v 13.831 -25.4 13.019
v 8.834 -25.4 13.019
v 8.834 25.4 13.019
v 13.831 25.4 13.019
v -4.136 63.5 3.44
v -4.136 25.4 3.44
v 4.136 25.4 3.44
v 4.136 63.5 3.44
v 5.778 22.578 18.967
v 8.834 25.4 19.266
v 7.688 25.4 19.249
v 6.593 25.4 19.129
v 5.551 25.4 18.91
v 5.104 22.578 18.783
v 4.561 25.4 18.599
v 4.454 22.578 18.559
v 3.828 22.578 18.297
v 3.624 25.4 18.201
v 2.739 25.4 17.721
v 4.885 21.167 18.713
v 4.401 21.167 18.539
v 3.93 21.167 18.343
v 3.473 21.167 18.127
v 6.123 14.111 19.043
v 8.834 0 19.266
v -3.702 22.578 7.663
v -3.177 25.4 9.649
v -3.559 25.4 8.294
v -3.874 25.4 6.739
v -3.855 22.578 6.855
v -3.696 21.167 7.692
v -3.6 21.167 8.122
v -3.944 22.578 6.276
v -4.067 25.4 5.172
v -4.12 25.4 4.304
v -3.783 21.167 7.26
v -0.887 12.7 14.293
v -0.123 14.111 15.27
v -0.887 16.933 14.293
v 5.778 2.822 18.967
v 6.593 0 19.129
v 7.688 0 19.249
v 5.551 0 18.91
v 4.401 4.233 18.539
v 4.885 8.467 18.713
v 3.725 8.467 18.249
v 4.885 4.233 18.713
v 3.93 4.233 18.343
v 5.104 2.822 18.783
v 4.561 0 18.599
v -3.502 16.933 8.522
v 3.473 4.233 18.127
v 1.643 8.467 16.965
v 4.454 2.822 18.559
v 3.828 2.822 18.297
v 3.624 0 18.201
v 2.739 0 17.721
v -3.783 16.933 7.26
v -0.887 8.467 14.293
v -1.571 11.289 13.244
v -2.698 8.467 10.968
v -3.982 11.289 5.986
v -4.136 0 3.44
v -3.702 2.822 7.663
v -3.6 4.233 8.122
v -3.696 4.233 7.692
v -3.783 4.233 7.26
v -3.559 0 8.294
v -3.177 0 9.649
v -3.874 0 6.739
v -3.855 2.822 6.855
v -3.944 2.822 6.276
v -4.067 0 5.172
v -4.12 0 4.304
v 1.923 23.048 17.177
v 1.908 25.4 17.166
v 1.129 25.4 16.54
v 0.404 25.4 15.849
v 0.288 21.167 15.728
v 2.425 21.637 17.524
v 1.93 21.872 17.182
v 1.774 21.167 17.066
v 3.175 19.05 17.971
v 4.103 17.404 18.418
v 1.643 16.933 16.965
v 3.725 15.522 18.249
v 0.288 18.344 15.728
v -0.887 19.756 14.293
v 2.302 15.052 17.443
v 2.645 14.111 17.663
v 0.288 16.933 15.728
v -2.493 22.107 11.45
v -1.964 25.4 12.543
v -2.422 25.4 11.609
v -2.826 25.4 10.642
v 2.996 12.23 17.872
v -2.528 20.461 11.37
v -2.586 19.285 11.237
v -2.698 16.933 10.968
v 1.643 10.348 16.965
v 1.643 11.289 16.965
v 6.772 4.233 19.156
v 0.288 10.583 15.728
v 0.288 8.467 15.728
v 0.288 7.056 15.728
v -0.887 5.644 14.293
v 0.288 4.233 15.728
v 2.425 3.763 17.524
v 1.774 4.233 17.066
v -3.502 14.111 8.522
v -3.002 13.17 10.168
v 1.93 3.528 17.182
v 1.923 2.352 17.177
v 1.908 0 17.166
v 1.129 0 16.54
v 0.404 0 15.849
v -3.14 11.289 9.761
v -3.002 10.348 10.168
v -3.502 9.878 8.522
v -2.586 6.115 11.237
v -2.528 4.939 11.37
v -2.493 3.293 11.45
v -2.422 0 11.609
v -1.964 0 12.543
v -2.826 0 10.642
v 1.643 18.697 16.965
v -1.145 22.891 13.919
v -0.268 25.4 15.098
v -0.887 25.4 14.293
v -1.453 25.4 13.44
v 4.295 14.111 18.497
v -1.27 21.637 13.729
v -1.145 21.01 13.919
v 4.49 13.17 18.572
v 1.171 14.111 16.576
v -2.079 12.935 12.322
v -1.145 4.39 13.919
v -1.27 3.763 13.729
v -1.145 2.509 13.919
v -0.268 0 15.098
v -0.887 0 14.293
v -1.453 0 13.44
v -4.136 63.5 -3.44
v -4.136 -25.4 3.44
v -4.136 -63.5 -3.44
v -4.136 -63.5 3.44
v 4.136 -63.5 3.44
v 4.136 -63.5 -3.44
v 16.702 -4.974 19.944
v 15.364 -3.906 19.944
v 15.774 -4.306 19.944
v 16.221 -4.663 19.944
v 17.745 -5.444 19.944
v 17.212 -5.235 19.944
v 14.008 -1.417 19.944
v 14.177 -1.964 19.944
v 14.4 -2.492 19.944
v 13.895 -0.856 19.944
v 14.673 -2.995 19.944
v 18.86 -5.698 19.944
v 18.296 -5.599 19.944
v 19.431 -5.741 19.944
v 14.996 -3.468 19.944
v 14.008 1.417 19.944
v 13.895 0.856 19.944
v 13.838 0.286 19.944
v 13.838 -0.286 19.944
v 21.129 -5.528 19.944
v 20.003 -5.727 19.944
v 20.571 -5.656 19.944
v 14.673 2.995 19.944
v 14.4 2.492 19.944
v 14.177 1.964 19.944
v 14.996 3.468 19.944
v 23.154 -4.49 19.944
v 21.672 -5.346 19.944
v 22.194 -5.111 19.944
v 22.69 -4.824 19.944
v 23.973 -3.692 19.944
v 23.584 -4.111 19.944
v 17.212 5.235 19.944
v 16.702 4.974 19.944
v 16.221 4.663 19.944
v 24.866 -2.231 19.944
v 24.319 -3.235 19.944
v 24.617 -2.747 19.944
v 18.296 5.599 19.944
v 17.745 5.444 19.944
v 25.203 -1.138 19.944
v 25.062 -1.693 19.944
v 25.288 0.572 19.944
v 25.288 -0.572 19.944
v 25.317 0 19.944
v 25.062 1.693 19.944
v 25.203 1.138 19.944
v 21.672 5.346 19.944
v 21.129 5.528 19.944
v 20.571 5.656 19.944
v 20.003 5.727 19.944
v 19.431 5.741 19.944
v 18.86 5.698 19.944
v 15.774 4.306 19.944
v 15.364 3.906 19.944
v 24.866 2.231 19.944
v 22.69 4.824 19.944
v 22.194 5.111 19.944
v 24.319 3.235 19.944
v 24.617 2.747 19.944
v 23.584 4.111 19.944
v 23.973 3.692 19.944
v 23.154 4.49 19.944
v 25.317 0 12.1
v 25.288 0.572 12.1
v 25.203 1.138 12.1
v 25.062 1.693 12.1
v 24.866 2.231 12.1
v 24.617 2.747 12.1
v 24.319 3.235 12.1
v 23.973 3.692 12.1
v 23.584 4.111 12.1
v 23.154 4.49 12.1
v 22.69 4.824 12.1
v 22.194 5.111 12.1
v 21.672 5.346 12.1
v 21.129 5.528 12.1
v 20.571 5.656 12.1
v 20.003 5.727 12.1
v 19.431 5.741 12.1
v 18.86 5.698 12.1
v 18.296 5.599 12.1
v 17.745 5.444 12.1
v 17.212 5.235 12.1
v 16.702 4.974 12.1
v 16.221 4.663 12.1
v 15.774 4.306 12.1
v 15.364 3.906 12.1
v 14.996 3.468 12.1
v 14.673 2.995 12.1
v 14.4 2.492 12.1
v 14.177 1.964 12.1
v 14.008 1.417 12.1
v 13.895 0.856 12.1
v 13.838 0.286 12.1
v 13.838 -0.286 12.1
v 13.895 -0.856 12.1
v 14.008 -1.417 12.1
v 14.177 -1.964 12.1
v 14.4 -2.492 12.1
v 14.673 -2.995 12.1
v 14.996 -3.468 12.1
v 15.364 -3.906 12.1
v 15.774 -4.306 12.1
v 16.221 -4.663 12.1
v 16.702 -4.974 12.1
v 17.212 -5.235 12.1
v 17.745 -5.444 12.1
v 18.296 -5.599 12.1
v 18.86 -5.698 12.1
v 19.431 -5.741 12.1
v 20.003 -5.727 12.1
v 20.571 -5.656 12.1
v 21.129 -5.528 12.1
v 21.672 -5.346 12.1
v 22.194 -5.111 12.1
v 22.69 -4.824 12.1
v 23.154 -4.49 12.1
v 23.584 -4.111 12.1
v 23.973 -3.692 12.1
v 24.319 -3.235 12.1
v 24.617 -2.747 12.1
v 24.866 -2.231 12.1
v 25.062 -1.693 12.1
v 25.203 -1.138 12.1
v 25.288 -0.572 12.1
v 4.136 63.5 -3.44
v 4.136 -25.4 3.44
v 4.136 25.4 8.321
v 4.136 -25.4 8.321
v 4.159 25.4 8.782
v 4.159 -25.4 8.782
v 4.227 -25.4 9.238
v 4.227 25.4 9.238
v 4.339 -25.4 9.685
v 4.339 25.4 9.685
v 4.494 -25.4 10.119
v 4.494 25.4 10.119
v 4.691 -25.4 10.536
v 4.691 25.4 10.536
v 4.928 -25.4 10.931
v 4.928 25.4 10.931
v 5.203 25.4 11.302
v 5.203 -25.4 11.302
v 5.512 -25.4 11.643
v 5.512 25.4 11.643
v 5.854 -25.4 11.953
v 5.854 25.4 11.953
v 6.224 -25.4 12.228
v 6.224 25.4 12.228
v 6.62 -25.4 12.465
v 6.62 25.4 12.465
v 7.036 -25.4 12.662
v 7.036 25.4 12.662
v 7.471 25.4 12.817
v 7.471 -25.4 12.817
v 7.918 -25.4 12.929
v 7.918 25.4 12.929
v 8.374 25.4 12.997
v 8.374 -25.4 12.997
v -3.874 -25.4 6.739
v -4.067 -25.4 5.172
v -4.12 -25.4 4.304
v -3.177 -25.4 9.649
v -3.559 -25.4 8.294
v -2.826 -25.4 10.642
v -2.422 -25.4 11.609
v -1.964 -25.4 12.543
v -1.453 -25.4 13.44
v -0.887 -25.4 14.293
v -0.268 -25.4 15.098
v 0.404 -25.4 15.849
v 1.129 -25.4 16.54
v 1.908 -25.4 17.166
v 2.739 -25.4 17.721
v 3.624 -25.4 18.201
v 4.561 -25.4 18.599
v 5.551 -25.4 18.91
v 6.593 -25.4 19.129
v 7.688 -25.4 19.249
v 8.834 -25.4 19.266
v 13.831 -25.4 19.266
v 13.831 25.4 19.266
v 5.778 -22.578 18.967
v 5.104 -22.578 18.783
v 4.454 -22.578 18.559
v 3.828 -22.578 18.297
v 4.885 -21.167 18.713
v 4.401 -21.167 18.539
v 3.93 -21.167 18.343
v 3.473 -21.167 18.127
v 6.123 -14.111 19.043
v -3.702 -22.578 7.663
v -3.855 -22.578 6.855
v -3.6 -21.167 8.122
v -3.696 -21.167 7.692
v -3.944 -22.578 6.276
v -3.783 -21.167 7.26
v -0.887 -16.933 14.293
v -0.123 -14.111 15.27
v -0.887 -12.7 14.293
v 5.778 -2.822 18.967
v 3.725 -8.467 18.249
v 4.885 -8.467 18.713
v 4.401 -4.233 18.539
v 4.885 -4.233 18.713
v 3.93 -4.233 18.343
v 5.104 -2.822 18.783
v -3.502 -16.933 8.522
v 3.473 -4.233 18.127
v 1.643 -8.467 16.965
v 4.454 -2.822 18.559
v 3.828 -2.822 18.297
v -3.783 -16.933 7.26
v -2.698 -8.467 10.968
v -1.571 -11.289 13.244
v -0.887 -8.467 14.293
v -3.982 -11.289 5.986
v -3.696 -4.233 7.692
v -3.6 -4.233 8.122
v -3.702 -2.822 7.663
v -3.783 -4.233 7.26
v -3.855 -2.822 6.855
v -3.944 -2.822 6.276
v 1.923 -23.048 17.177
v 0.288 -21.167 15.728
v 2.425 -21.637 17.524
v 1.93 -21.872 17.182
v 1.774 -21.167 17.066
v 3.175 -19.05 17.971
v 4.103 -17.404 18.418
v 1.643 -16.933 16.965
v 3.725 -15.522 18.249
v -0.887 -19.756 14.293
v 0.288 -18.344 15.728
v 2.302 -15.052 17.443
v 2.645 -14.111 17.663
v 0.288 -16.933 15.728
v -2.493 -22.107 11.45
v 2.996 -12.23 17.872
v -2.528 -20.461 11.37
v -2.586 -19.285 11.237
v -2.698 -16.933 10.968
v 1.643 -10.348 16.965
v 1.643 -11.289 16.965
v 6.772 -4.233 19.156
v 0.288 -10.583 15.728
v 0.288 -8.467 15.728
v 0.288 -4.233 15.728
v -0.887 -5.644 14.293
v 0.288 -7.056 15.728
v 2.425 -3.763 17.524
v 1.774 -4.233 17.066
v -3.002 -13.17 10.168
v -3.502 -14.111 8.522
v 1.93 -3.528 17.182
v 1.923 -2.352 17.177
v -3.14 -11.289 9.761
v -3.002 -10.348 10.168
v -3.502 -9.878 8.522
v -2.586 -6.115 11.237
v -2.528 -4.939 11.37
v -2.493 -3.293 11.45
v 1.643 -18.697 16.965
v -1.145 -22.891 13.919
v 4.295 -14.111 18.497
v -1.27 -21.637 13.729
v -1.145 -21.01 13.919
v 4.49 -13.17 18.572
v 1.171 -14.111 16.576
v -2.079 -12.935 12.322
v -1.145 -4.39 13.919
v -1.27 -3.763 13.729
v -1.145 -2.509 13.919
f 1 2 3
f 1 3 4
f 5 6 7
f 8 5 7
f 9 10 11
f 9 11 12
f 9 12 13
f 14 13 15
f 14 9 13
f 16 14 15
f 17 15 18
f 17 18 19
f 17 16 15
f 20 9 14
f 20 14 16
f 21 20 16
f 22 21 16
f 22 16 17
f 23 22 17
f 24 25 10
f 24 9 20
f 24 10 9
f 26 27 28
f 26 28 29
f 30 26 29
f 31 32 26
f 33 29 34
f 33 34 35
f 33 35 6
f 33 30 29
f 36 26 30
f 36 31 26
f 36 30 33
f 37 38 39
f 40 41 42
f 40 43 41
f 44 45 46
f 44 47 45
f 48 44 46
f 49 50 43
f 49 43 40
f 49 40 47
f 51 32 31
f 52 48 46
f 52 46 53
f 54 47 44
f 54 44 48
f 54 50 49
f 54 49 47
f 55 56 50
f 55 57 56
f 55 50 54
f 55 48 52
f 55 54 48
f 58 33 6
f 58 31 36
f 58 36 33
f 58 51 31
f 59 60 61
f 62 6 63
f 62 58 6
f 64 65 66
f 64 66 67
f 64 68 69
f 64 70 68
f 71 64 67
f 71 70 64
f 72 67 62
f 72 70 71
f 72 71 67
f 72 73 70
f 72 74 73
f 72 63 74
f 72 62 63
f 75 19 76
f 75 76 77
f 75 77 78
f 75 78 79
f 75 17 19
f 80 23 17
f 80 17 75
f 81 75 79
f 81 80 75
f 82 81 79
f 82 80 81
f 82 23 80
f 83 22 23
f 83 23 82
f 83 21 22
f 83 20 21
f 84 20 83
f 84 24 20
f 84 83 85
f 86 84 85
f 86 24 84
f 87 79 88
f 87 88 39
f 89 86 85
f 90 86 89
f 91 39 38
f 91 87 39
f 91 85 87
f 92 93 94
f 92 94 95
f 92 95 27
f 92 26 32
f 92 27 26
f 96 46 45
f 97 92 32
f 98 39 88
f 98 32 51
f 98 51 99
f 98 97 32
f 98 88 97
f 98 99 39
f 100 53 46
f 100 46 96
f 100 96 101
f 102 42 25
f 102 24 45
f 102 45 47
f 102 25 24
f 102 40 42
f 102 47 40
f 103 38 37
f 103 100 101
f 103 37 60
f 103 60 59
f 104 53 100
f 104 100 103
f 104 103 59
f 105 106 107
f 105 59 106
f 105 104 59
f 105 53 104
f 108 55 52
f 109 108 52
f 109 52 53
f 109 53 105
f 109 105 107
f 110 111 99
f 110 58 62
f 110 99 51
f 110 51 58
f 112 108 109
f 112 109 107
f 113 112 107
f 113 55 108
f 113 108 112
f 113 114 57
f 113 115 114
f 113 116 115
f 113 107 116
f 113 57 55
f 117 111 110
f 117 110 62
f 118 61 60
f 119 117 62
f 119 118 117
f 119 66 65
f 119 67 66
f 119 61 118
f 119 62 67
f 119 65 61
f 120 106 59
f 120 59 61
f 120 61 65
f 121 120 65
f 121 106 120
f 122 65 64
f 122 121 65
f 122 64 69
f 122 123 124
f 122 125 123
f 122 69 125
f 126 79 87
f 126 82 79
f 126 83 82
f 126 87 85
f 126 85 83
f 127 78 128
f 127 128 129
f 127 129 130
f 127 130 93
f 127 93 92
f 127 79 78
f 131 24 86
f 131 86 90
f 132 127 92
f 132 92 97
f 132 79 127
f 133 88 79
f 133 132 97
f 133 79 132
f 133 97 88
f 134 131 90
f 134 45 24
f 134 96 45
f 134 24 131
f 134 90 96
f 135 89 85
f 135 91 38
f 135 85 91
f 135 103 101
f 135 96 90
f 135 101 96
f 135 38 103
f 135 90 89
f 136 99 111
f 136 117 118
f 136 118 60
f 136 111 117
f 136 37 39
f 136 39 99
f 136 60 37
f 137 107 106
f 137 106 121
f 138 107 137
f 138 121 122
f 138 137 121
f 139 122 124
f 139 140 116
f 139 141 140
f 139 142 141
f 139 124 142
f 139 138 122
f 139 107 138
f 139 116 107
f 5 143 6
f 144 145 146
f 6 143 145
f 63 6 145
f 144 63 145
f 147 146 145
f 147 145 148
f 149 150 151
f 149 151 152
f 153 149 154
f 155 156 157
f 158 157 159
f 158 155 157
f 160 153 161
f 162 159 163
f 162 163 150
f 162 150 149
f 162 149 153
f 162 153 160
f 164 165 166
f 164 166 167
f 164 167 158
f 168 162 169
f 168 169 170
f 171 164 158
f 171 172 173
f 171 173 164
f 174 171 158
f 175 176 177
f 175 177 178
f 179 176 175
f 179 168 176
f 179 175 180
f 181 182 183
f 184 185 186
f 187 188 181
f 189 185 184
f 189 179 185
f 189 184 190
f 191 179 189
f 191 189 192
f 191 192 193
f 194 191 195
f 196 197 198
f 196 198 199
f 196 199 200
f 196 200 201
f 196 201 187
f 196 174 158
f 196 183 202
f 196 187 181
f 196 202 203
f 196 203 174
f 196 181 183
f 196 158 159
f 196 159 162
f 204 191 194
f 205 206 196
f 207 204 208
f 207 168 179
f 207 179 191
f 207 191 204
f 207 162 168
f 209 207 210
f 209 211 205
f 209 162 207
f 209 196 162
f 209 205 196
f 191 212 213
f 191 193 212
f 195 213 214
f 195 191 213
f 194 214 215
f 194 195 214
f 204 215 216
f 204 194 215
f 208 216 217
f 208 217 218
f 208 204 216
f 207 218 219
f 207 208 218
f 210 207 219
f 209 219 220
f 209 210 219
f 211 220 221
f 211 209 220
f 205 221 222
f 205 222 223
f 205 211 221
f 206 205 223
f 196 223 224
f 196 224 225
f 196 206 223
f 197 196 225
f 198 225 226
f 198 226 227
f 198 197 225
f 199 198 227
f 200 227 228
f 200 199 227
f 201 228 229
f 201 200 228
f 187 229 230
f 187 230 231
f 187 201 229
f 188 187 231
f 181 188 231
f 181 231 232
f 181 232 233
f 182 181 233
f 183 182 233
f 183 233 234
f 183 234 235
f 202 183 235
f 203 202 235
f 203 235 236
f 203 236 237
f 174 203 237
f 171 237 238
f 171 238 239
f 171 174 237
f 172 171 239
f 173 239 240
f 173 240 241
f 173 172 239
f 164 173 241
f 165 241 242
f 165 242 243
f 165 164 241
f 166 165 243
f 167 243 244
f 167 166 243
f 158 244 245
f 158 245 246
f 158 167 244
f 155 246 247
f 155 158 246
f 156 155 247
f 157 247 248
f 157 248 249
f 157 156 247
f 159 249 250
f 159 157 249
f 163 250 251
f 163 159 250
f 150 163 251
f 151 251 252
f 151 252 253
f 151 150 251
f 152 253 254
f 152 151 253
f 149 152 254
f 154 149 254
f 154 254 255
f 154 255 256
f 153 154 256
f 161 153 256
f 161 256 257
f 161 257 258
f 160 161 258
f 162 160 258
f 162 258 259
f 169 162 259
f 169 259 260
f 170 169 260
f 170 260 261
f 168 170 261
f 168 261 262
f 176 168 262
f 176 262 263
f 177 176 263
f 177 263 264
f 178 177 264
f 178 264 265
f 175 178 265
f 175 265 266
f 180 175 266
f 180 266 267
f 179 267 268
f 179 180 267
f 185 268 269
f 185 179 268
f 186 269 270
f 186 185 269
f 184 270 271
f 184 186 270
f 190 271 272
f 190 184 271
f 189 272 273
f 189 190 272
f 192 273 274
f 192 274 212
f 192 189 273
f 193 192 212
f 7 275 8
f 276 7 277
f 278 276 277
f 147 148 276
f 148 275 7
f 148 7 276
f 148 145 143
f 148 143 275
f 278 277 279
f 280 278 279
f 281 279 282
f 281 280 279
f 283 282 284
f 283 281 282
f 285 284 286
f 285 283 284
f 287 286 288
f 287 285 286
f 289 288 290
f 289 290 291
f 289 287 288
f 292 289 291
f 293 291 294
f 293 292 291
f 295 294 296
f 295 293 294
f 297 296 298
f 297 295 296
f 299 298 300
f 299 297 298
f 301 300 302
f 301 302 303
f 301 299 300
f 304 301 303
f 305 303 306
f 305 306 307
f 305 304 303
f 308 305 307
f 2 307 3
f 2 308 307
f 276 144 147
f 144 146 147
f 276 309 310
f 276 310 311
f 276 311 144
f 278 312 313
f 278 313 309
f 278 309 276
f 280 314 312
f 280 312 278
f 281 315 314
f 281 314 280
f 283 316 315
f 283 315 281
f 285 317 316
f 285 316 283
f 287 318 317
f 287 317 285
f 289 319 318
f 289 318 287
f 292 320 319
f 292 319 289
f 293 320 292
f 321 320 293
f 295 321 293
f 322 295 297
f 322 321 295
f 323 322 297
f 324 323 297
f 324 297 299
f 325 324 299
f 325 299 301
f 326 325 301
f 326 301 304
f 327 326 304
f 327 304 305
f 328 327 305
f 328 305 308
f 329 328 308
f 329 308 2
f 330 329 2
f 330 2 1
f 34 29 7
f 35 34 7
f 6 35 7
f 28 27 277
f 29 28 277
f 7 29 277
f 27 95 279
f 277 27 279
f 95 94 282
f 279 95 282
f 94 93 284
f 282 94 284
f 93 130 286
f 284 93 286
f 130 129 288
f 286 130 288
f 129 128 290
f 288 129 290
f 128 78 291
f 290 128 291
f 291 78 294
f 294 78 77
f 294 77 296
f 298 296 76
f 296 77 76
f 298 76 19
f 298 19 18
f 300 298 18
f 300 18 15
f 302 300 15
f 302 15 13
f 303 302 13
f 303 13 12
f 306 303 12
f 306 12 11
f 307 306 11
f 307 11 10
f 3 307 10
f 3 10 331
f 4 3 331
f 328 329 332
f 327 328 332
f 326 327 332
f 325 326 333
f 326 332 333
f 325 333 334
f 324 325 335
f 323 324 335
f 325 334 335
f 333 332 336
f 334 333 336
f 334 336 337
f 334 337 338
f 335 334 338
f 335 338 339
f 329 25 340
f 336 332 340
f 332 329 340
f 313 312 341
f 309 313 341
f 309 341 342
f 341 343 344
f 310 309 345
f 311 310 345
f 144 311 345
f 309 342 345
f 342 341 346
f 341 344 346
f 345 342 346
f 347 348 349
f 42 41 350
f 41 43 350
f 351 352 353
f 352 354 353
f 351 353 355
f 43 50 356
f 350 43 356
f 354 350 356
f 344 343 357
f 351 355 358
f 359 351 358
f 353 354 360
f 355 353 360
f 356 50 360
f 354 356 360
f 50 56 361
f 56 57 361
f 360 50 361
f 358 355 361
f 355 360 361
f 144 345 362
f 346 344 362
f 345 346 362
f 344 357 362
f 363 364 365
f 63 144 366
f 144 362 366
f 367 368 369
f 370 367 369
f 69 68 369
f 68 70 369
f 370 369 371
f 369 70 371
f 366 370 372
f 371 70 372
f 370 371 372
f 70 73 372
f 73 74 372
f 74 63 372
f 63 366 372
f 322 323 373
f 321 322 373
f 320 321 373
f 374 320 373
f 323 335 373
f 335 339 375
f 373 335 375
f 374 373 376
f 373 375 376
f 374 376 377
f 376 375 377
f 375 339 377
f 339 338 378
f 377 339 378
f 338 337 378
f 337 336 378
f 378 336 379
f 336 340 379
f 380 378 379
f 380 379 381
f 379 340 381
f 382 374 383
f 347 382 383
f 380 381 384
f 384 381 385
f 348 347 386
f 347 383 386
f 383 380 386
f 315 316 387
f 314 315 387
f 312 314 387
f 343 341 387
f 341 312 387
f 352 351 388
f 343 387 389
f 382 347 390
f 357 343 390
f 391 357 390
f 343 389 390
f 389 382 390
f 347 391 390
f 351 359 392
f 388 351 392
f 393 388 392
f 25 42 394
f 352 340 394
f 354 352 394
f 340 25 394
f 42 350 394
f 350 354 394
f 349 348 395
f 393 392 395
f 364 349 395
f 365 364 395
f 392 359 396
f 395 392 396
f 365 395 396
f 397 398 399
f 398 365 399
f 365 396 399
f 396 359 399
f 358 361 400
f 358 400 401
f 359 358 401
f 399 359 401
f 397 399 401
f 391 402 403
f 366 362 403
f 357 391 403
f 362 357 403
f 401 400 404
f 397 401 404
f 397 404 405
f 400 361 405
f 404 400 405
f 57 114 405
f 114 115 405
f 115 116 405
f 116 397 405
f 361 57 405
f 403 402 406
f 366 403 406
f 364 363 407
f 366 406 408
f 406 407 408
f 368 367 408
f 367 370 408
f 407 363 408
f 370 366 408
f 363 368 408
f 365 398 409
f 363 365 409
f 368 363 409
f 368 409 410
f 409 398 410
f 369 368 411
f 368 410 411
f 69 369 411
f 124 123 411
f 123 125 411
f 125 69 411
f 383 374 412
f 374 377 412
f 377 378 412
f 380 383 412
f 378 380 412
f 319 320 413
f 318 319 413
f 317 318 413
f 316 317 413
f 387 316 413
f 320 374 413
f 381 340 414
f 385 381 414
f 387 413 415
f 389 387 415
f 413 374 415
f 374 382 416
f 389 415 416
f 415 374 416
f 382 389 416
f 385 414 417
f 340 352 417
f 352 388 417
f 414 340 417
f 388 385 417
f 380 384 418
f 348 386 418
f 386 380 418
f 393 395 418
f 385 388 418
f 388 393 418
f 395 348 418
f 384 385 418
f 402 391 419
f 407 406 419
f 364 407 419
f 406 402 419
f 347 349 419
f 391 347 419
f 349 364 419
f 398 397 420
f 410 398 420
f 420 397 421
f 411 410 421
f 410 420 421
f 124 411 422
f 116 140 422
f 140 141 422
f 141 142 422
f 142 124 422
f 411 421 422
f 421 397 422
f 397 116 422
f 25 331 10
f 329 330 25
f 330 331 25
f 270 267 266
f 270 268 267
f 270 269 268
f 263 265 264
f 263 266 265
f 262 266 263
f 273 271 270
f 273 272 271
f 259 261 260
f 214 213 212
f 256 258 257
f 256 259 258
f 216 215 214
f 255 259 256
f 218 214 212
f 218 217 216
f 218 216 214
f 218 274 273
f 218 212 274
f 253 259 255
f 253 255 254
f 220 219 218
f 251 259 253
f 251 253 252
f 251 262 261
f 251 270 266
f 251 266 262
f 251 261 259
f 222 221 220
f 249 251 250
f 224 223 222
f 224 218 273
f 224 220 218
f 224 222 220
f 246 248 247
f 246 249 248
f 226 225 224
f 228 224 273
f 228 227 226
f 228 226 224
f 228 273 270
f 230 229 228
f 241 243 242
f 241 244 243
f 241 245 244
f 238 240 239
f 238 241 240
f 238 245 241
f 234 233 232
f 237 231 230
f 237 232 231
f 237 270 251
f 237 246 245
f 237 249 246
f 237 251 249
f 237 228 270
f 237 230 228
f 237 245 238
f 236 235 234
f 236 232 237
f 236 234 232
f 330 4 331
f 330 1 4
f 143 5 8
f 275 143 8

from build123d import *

# Parameters (mm, degrees)
F0_W     = 8.2724904759
F0_H     = 6.8799975622
F1_DEPTH = 63.5
F2_DEPTH = 25.4


with BuildPart() as f1:
    # F0 (on Front) → F1 (new body, symmetric)
    with BuildSketch(Plane.XZ):
        Rectangle(F0_W, F0_H)
    extrude(amount=F1_DEPTH, both=True)

    # F0 (on Front) → F2 (join, symmetric)
    with BuildSketch(Plane.XZ):
        with BuildLine():
            add(Edge.make_bspline(
                [(8.8344048709, 19.2660813623), (0.2333819866, 19.5338707417), (-4.1649181363, 11.0128456192), (-4.1362452379, 3.4399987811)],
                knots=[0, 0, 0, 0, 20.4622250528, 20.4622250528, 20.4622250528, 20.4622250528], degree=3))
            Line((-4.1362452379, 3.4399987811), (4.1362452379, 3.4399987811))
            Line((4.1362452379, 3.4399987811), (4.1362452379, 8.3213185052))
            ThreePointArc((4.1362452379, 8.3213185052), (5.5123043353, 11.6434190407), (8.8344048709, 13.0194781381))
            Line((8.8344048709, 13.0194781381), (13.8307970829, 13.0194781381))
            Line((13.8307970829, 13.0194781381), (13.8307970829, 16.8308063556))
            Line((13.8307970829, 16.8308063556), (13.8307970829, 19.2660813623))
            Line((13.8307970829, 19.2660813623), (8.8344048709, 19.2660813623))
        make_face()
    extrude(amount=F2_DEPTH, both=True)


with BuildPart() as f3:
    # F0 (on Front) → F3 (revolve)
    with BuildSketch(Plane.XZ):
        Polygon((19.5737686008, 19.9436039542), (19.5737686008, 19.2660813623), (19.5737686008, 17.6438695487), (19.5737686008, 16.0216577351), (19.5737686008, 16.0211566895), (19.5737686008, 13.0194781381), (19.5737686008, 12.099711516), (25.3167401188, 12.099711516), (25.3167401188, 19.9436039542), align=None)
    revolve(axis=Axis((19.5737686008, 0, 17.6438695487), (0, 0, 1)))


solid = Compound([f1.part, f3.part])
